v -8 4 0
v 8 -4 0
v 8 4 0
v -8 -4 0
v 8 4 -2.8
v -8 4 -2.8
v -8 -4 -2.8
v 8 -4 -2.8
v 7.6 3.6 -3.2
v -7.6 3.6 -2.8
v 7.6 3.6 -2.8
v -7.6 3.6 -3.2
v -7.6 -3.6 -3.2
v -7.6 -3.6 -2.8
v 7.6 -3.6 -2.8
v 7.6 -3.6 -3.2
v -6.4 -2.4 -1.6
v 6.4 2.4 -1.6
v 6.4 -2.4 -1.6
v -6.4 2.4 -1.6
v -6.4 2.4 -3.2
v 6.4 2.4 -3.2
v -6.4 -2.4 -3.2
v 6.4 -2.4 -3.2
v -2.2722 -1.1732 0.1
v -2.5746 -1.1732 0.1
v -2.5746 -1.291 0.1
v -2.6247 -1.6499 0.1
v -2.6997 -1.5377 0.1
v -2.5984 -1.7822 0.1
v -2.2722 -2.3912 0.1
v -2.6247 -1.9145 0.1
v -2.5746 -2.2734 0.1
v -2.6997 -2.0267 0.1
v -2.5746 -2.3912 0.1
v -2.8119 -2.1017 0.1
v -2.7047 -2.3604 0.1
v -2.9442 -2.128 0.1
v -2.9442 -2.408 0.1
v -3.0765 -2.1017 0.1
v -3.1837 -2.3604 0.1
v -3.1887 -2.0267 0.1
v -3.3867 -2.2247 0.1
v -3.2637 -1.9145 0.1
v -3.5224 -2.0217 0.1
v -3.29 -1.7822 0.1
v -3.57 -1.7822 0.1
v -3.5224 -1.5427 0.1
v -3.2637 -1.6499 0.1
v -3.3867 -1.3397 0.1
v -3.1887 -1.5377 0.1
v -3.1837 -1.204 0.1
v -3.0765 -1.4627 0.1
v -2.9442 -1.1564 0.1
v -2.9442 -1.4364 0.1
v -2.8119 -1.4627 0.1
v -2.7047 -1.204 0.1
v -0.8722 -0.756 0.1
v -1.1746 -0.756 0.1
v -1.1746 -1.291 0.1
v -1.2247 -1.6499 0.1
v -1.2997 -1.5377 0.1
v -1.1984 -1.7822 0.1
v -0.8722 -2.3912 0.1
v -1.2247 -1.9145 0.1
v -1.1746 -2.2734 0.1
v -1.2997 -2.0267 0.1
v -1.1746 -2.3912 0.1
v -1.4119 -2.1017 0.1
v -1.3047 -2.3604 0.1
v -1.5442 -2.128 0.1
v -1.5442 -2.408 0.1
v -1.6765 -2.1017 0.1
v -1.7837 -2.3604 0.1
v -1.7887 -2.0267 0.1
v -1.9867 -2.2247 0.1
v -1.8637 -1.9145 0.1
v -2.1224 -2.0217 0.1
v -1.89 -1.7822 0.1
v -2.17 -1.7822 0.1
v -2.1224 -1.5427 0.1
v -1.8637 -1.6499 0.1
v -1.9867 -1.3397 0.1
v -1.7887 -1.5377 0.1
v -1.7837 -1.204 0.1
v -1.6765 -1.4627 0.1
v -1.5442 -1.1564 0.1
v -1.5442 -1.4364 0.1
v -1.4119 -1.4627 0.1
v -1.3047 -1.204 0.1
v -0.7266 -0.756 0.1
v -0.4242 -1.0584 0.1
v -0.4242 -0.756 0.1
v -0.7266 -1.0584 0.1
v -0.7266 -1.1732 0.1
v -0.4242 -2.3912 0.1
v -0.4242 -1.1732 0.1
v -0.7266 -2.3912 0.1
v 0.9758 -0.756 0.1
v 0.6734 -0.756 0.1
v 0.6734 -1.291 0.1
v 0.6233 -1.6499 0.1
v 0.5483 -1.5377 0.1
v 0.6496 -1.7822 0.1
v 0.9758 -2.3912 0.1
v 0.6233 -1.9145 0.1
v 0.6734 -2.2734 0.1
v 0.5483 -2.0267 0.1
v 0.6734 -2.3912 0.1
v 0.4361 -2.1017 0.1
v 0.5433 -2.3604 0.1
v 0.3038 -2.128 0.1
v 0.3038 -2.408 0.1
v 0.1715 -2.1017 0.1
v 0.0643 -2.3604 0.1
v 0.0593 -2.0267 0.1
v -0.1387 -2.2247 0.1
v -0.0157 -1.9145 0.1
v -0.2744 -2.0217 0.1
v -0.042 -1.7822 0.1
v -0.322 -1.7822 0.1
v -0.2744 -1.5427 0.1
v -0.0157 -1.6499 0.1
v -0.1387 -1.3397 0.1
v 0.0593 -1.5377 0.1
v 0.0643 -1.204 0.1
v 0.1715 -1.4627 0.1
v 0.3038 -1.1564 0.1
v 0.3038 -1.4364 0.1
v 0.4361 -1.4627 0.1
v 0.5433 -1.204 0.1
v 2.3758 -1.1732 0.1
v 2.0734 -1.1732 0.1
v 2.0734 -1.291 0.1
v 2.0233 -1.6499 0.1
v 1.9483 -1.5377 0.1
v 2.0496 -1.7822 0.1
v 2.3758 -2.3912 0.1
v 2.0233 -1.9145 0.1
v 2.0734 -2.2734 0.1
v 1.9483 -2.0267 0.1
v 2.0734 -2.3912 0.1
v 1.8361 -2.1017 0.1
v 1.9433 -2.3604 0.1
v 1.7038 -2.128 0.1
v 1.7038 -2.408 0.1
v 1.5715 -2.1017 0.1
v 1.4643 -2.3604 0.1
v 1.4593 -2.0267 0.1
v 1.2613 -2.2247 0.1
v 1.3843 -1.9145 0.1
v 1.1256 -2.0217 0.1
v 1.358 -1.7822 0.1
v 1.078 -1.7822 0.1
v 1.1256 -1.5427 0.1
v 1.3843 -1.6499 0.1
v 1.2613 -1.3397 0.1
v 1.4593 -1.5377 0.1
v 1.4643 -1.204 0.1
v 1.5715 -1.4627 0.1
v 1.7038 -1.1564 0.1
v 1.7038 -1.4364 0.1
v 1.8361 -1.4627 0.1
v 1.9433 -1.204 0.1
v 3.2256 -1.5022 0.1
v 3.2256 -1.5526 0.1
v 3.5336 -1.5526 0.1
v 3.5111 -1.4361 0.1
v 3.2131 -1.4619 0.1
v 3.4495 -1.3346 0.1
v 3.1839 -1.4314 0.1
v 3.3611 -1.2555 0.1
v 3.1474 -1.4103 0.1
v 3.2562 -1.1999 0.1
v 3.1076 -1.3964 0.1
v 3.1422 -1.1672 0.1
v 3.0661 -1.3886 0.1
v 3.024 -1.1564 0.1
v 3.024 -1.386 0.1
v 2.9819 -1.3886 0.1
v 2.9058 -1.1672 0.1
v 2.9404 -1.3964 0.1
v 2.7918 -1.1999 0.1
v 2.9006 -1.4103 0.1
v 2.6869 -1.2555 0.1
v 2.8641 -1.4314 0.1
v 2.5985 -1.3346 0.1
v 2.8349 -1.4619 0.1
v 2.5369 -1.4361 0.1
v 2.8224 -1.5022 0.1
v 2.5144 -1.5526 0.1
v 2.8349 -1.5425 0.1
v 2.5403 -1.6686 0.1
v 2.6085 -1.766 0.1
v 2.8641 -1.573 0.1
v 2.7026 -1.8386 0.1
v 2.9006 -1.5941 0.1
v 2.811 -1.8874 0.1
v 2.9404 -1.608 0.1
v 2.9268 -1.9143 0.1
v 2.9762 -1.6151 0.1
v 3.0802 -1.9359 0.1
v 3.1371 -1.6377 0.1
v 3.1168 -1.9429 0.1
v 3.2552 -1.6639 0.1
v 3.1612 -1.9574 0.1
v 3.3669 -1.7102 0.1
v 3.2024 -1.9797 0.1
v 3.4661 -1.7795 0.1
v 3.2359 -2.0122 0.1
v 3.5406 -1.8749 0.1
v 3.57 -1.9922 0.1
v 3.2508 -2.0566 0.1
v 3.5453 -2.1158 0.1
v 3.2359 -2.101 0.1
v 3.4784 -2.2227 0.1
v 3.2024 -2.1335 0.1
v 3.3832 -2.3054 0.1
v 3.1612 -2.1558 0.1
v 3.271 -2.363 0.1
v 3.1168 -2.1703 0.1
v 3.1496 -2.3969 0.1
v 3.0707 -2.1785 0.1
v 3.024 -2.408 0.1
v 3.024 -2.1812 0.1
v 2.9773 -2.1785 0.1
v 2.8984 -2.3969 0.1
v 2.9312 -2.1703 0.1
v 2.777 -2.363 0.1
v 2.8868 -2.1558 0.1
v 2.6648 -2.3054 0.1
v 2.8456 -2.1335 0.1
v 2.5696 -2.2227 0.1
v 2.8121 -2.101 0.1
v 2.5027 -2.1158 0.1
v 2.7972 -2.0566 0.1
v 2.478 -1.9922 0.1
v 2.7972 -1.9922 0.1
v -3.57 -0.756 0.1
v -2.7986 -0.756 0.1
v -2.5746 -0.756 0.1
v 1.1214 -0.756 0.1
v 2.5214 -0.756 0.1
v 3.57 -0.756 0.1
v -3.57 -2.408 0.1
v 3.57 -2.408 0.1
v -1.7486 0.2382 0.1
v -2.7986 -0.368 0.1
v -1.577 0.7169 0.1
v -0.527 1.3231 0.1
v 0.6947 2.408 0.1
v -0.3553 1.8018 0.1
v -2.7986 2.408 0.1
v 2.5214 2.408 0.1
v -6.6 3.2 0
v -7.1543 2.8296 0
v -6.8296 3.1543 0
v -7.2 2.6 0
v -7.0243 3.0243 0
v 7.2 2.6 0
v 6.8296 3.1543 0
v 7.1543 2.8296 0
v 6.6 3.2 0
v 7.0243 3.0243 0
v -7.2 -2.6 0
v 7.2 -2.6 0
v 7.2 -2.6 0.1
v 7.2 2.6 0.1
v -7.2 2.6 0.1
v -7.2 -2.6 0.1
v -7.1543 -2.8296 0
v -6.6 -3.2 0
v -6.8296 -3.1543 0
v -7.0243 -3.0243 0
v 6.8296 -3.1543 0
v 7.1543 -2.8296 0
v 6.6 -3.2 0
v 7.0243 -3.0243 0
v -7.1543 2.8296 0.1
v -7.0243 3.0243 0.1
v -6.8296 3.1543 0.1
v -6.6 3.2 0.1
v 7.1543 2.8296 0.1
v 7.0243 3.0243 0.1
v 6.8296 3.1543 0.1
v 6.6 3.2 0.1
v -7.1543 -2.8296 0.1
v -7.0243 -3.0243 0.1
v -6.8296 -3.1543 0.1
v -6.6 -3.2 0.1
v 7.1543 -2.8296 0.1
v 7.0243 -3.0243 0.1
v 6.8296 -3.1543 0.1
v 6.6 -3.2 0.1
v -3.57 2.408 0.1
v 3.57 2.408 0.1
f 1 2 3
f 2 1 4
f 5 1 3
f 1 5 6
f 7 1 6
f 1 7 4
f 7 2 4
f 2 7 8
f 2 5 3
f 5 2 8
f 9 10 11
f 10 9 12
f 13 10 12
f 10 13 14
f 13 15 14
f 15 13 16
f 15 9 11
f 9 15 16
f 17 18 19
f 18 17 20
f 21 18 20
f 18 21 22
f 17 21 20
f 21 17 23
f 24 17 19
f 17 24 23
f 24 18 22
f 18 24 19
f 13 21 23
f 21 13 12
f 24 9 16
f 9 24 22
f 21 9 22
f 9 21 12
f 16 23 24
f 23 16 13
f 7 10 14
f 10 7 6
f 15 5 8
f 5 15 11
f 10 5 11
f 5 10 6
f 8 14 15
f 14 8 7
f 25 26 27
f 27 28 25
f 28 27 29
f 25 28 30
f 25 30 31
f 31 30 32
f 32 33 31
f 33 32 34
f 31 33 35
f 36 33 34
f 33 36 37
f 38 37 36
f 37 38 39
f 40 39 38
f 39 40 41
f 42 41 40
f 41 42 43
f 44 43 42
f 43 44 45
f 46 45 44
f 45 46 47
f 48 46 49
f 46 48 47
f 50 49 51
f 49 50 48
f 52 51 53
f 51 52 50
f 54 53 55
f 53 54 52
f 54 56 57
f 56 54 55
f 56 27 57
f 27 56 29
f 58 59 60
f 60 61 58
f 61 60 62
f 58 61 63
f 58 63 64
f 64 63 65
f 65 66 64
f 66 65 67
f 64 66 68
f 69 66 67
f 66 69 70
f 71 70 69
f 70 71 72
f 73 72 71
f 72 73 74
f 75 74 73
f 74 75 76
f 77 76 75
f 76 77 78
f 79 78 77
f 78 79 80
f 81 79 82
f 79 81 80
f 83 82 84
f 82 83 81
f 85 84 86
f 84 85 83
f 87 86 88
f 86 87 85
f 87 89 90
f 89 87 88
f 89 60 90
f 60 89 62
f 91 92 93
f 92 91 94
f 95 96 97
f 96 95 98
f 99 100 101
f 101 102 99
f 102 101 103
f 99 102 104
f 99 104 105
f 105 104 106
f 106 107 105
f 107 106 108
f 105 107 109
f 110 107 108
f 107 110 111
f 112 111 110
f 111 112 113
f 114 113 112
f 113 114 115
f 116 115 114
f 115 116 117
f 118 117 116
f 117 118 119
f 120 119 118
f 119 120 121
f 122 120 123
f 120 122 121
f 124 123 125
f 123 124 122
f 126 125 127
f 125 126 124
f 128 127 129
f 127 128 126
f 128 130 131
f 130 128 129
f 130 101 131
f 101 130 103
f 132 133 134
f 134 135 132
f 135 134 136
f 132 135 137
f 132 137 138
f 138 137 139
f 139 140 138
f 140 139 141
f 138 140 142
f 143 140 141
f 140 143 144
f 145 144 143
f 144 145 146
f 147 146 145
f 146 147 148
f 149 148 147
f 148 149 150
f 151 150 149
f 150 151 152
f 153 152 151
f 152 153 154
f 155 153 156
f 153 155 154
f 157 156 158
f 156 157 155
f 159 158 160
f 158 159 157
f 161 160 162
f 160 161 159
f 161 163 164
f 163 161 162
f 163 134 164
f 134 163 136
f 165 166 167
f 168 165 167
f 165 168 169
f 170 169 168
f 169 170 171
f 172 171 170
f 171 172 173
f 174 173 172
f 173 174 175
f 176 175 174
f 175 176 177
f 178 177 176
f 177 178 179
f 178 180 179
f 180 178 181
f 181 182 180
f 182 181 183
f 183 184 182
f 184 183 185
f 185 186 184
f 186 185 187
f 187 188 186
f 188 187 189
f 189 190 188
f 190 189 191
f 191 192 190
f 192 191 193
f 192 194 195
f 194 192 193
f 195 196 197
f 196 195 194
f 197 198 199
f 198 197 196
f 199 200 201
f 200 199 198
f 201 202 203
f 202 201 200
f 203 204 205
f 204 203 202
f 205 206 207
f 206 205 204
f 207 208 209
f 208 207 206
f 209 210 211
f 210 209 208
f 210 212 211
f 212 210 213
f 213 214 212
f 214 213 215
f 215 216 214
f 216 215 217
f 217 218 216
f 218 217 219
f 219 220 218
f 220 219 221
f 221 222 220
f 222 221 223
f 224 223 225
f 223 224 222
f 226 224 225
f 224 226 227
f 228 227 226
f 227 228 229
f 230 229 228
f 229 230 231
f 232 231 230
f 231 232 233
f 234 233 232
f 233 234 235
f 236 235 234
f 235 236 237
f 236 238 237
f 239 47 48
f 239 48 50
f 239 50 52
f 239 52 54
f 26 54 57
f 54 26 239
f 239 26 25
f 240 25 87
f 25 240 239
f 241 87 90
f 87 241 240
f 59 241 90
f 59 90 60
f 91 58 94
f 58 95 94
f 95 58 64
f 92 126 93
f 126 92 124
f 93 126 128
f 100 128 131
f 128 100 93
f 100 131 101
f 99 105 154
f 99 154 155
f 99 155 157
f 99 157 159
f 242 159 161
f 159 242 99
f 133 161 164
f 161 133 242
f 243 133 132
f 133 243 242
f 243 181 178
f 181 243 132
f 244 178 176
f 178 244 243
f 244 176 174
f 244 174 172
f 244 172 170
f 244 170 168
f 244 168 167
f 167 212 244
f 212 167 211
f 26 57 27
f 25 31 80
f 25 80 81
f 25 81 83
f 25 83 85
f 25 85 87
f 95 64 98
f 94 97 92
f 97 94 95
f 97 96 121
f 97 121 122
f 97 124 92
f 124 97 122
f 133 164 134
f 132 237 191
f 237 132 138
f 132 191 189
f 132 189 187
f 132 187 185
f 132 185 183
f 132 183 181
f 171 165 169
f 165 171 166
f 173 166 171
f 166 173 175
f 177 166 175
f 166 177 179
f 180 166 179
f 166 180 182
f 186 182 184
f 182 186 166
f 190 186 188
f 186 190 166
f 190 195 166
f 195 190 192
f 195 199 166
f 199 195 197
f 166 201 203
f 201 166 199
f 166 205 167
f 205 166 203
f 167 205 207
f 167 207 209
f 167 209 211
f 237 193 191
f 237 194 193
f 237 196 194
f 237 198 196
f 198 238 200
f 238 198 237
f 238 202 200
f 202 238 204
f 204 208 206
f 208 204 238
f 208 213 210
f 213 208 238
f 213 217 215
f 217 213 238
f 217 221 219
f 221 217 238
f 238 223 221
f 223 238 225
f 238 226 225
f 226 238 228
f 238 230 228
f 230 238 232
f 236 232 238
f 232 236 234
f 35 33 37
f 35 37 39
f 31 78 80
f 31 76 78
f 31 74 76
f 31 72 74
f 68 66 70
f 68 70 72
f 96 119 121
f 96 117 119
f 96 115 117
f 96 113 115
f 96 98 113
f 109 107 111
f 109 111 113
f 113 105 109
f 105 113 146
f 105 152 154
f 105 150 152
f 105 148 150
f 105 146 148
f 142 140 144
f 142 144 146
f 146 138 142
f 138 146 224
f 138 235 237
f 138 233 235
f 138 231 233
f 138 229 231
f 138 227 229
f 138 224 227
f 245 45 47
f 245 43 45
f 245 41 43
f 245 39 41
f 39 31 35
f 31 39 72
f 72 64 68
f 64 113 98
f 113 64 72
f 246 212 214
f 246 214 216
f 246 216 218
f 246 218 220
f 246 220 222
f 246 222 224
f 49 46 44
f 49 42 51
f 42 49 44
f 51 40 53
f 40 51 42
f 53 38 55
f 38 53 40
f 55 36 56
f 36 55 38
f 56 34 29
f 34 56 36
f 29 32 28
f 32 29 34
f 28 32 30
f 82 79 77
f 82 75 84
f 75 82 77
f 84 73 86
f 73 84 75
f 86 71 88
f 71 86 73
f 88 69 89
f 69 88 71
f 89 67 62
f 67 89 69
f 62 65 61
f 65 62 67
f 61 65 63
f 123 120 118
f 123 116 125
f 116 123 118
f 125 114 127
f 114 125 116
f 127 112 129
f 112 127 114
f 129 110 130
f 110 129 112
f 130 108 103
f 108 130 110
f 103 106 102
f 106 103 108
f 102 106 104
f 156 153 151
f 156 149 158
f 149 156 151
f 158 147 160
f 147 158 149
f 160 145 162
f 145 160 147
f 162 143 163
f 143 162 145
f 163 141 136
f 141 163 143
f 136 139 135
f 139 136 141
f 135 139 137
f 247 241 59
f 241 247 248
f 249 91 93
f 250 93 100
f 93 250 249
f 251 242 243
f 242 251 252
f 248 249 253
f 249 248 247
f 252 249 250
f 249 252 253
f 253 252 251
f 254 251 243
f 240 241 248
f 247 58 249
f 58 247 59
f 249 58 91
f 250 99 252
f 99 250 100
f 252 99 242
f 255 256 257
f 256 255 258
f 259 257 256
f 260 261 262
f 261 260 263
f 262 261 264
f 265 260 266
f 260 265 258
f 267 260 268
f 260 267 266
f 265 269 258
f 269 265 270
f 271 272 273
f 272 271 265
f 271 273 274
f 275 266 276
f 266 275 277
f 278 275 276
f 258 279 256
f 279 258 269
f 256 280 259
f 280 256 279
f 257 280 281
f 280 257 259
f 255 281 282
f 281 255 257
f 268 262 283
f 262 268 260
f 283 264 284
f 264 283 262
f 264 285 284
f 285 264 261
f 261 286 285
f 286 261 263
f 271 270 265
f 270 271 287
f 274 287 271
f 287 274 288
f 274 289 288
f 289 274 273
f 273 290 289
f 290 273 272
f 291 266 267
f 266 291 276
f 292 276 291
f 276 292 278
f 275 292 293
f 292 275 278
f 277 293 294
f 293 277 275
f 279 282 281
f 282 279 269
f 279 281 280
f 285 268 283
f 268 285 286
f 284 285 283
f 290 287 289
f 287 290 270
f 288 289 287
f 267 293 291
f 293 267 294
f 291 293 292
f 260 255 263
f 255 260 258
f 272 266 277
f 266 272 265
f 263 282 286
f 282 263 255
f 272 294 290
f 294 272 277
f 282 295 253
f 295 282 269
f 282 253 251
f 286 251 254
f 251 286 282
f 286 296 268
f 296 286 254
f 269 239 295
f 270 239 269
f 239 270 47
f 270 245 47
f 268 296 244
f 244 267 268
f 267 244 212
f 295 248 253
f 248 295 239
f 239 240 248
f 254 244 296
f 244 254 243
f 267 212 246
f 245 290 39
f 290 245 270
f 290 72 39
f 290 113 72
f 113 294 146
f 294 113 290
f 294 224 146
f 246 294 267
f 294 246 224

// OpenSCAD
use <../lib.scad>
use <3069b.scad>
use <6148328bb.scad>
function ldraw_lib__3069bd2b() = [
// 0 Tile  1 x  2 with White Adidas Logo on Black Background Sticker
// 0 Name: 3069bd2b.dat
// 0 Author: Vincent Messenet [Cheenzo]
// 0 !LDRAW_ORG Shortcut UPDATE 2026-05
// 0 !LICENSE Licensed under CC BY 4.0 : see CAreadme.txt
// 
// 0 BFC CERTIFY CCW
  [0,"BFC","CERTIFY"],
  [0,"BFC","CCW"],
// 
// 0 !CATEGORY Sticker Shortcut
// 
// 0 !KEYWORDS Bricklink 3069pb0683, Porsche 919 Hybrid and 917K Pit Lane
// 0 !KEYWORDS set 75876, Speed Champions
// 
// 0 !HISTORY 2026-05-31 [OrionP] Official Update 2026-05
// 
// 1 16 0 0 0 1 0 0 0 1 0 0 0 1 3069b.dat
  [1,16,0,0,0,1,0,0,0,1,0,0,0,1, ldraw_lib__3069b()],
// 1 16 0 0 0 1 0 0 0 1 0 0 0 1 6148328bb.dat
  [1,16,0,0,0,1,0,0,0,1,0,0,0,1, ldraw_lib__6148328bb()],
];
module ldraw_lib__3069bd2b(step=0, col=false, unit=2/5, alt=false, line=0.2, solid=!$preview)
    makepoly(ldraw_lib__3069bd2b(), step=step, col=col, unit=unit, alt=alt, line=line, solid=solid);
ldraw_lib__3069bd2b(line=0.2);
